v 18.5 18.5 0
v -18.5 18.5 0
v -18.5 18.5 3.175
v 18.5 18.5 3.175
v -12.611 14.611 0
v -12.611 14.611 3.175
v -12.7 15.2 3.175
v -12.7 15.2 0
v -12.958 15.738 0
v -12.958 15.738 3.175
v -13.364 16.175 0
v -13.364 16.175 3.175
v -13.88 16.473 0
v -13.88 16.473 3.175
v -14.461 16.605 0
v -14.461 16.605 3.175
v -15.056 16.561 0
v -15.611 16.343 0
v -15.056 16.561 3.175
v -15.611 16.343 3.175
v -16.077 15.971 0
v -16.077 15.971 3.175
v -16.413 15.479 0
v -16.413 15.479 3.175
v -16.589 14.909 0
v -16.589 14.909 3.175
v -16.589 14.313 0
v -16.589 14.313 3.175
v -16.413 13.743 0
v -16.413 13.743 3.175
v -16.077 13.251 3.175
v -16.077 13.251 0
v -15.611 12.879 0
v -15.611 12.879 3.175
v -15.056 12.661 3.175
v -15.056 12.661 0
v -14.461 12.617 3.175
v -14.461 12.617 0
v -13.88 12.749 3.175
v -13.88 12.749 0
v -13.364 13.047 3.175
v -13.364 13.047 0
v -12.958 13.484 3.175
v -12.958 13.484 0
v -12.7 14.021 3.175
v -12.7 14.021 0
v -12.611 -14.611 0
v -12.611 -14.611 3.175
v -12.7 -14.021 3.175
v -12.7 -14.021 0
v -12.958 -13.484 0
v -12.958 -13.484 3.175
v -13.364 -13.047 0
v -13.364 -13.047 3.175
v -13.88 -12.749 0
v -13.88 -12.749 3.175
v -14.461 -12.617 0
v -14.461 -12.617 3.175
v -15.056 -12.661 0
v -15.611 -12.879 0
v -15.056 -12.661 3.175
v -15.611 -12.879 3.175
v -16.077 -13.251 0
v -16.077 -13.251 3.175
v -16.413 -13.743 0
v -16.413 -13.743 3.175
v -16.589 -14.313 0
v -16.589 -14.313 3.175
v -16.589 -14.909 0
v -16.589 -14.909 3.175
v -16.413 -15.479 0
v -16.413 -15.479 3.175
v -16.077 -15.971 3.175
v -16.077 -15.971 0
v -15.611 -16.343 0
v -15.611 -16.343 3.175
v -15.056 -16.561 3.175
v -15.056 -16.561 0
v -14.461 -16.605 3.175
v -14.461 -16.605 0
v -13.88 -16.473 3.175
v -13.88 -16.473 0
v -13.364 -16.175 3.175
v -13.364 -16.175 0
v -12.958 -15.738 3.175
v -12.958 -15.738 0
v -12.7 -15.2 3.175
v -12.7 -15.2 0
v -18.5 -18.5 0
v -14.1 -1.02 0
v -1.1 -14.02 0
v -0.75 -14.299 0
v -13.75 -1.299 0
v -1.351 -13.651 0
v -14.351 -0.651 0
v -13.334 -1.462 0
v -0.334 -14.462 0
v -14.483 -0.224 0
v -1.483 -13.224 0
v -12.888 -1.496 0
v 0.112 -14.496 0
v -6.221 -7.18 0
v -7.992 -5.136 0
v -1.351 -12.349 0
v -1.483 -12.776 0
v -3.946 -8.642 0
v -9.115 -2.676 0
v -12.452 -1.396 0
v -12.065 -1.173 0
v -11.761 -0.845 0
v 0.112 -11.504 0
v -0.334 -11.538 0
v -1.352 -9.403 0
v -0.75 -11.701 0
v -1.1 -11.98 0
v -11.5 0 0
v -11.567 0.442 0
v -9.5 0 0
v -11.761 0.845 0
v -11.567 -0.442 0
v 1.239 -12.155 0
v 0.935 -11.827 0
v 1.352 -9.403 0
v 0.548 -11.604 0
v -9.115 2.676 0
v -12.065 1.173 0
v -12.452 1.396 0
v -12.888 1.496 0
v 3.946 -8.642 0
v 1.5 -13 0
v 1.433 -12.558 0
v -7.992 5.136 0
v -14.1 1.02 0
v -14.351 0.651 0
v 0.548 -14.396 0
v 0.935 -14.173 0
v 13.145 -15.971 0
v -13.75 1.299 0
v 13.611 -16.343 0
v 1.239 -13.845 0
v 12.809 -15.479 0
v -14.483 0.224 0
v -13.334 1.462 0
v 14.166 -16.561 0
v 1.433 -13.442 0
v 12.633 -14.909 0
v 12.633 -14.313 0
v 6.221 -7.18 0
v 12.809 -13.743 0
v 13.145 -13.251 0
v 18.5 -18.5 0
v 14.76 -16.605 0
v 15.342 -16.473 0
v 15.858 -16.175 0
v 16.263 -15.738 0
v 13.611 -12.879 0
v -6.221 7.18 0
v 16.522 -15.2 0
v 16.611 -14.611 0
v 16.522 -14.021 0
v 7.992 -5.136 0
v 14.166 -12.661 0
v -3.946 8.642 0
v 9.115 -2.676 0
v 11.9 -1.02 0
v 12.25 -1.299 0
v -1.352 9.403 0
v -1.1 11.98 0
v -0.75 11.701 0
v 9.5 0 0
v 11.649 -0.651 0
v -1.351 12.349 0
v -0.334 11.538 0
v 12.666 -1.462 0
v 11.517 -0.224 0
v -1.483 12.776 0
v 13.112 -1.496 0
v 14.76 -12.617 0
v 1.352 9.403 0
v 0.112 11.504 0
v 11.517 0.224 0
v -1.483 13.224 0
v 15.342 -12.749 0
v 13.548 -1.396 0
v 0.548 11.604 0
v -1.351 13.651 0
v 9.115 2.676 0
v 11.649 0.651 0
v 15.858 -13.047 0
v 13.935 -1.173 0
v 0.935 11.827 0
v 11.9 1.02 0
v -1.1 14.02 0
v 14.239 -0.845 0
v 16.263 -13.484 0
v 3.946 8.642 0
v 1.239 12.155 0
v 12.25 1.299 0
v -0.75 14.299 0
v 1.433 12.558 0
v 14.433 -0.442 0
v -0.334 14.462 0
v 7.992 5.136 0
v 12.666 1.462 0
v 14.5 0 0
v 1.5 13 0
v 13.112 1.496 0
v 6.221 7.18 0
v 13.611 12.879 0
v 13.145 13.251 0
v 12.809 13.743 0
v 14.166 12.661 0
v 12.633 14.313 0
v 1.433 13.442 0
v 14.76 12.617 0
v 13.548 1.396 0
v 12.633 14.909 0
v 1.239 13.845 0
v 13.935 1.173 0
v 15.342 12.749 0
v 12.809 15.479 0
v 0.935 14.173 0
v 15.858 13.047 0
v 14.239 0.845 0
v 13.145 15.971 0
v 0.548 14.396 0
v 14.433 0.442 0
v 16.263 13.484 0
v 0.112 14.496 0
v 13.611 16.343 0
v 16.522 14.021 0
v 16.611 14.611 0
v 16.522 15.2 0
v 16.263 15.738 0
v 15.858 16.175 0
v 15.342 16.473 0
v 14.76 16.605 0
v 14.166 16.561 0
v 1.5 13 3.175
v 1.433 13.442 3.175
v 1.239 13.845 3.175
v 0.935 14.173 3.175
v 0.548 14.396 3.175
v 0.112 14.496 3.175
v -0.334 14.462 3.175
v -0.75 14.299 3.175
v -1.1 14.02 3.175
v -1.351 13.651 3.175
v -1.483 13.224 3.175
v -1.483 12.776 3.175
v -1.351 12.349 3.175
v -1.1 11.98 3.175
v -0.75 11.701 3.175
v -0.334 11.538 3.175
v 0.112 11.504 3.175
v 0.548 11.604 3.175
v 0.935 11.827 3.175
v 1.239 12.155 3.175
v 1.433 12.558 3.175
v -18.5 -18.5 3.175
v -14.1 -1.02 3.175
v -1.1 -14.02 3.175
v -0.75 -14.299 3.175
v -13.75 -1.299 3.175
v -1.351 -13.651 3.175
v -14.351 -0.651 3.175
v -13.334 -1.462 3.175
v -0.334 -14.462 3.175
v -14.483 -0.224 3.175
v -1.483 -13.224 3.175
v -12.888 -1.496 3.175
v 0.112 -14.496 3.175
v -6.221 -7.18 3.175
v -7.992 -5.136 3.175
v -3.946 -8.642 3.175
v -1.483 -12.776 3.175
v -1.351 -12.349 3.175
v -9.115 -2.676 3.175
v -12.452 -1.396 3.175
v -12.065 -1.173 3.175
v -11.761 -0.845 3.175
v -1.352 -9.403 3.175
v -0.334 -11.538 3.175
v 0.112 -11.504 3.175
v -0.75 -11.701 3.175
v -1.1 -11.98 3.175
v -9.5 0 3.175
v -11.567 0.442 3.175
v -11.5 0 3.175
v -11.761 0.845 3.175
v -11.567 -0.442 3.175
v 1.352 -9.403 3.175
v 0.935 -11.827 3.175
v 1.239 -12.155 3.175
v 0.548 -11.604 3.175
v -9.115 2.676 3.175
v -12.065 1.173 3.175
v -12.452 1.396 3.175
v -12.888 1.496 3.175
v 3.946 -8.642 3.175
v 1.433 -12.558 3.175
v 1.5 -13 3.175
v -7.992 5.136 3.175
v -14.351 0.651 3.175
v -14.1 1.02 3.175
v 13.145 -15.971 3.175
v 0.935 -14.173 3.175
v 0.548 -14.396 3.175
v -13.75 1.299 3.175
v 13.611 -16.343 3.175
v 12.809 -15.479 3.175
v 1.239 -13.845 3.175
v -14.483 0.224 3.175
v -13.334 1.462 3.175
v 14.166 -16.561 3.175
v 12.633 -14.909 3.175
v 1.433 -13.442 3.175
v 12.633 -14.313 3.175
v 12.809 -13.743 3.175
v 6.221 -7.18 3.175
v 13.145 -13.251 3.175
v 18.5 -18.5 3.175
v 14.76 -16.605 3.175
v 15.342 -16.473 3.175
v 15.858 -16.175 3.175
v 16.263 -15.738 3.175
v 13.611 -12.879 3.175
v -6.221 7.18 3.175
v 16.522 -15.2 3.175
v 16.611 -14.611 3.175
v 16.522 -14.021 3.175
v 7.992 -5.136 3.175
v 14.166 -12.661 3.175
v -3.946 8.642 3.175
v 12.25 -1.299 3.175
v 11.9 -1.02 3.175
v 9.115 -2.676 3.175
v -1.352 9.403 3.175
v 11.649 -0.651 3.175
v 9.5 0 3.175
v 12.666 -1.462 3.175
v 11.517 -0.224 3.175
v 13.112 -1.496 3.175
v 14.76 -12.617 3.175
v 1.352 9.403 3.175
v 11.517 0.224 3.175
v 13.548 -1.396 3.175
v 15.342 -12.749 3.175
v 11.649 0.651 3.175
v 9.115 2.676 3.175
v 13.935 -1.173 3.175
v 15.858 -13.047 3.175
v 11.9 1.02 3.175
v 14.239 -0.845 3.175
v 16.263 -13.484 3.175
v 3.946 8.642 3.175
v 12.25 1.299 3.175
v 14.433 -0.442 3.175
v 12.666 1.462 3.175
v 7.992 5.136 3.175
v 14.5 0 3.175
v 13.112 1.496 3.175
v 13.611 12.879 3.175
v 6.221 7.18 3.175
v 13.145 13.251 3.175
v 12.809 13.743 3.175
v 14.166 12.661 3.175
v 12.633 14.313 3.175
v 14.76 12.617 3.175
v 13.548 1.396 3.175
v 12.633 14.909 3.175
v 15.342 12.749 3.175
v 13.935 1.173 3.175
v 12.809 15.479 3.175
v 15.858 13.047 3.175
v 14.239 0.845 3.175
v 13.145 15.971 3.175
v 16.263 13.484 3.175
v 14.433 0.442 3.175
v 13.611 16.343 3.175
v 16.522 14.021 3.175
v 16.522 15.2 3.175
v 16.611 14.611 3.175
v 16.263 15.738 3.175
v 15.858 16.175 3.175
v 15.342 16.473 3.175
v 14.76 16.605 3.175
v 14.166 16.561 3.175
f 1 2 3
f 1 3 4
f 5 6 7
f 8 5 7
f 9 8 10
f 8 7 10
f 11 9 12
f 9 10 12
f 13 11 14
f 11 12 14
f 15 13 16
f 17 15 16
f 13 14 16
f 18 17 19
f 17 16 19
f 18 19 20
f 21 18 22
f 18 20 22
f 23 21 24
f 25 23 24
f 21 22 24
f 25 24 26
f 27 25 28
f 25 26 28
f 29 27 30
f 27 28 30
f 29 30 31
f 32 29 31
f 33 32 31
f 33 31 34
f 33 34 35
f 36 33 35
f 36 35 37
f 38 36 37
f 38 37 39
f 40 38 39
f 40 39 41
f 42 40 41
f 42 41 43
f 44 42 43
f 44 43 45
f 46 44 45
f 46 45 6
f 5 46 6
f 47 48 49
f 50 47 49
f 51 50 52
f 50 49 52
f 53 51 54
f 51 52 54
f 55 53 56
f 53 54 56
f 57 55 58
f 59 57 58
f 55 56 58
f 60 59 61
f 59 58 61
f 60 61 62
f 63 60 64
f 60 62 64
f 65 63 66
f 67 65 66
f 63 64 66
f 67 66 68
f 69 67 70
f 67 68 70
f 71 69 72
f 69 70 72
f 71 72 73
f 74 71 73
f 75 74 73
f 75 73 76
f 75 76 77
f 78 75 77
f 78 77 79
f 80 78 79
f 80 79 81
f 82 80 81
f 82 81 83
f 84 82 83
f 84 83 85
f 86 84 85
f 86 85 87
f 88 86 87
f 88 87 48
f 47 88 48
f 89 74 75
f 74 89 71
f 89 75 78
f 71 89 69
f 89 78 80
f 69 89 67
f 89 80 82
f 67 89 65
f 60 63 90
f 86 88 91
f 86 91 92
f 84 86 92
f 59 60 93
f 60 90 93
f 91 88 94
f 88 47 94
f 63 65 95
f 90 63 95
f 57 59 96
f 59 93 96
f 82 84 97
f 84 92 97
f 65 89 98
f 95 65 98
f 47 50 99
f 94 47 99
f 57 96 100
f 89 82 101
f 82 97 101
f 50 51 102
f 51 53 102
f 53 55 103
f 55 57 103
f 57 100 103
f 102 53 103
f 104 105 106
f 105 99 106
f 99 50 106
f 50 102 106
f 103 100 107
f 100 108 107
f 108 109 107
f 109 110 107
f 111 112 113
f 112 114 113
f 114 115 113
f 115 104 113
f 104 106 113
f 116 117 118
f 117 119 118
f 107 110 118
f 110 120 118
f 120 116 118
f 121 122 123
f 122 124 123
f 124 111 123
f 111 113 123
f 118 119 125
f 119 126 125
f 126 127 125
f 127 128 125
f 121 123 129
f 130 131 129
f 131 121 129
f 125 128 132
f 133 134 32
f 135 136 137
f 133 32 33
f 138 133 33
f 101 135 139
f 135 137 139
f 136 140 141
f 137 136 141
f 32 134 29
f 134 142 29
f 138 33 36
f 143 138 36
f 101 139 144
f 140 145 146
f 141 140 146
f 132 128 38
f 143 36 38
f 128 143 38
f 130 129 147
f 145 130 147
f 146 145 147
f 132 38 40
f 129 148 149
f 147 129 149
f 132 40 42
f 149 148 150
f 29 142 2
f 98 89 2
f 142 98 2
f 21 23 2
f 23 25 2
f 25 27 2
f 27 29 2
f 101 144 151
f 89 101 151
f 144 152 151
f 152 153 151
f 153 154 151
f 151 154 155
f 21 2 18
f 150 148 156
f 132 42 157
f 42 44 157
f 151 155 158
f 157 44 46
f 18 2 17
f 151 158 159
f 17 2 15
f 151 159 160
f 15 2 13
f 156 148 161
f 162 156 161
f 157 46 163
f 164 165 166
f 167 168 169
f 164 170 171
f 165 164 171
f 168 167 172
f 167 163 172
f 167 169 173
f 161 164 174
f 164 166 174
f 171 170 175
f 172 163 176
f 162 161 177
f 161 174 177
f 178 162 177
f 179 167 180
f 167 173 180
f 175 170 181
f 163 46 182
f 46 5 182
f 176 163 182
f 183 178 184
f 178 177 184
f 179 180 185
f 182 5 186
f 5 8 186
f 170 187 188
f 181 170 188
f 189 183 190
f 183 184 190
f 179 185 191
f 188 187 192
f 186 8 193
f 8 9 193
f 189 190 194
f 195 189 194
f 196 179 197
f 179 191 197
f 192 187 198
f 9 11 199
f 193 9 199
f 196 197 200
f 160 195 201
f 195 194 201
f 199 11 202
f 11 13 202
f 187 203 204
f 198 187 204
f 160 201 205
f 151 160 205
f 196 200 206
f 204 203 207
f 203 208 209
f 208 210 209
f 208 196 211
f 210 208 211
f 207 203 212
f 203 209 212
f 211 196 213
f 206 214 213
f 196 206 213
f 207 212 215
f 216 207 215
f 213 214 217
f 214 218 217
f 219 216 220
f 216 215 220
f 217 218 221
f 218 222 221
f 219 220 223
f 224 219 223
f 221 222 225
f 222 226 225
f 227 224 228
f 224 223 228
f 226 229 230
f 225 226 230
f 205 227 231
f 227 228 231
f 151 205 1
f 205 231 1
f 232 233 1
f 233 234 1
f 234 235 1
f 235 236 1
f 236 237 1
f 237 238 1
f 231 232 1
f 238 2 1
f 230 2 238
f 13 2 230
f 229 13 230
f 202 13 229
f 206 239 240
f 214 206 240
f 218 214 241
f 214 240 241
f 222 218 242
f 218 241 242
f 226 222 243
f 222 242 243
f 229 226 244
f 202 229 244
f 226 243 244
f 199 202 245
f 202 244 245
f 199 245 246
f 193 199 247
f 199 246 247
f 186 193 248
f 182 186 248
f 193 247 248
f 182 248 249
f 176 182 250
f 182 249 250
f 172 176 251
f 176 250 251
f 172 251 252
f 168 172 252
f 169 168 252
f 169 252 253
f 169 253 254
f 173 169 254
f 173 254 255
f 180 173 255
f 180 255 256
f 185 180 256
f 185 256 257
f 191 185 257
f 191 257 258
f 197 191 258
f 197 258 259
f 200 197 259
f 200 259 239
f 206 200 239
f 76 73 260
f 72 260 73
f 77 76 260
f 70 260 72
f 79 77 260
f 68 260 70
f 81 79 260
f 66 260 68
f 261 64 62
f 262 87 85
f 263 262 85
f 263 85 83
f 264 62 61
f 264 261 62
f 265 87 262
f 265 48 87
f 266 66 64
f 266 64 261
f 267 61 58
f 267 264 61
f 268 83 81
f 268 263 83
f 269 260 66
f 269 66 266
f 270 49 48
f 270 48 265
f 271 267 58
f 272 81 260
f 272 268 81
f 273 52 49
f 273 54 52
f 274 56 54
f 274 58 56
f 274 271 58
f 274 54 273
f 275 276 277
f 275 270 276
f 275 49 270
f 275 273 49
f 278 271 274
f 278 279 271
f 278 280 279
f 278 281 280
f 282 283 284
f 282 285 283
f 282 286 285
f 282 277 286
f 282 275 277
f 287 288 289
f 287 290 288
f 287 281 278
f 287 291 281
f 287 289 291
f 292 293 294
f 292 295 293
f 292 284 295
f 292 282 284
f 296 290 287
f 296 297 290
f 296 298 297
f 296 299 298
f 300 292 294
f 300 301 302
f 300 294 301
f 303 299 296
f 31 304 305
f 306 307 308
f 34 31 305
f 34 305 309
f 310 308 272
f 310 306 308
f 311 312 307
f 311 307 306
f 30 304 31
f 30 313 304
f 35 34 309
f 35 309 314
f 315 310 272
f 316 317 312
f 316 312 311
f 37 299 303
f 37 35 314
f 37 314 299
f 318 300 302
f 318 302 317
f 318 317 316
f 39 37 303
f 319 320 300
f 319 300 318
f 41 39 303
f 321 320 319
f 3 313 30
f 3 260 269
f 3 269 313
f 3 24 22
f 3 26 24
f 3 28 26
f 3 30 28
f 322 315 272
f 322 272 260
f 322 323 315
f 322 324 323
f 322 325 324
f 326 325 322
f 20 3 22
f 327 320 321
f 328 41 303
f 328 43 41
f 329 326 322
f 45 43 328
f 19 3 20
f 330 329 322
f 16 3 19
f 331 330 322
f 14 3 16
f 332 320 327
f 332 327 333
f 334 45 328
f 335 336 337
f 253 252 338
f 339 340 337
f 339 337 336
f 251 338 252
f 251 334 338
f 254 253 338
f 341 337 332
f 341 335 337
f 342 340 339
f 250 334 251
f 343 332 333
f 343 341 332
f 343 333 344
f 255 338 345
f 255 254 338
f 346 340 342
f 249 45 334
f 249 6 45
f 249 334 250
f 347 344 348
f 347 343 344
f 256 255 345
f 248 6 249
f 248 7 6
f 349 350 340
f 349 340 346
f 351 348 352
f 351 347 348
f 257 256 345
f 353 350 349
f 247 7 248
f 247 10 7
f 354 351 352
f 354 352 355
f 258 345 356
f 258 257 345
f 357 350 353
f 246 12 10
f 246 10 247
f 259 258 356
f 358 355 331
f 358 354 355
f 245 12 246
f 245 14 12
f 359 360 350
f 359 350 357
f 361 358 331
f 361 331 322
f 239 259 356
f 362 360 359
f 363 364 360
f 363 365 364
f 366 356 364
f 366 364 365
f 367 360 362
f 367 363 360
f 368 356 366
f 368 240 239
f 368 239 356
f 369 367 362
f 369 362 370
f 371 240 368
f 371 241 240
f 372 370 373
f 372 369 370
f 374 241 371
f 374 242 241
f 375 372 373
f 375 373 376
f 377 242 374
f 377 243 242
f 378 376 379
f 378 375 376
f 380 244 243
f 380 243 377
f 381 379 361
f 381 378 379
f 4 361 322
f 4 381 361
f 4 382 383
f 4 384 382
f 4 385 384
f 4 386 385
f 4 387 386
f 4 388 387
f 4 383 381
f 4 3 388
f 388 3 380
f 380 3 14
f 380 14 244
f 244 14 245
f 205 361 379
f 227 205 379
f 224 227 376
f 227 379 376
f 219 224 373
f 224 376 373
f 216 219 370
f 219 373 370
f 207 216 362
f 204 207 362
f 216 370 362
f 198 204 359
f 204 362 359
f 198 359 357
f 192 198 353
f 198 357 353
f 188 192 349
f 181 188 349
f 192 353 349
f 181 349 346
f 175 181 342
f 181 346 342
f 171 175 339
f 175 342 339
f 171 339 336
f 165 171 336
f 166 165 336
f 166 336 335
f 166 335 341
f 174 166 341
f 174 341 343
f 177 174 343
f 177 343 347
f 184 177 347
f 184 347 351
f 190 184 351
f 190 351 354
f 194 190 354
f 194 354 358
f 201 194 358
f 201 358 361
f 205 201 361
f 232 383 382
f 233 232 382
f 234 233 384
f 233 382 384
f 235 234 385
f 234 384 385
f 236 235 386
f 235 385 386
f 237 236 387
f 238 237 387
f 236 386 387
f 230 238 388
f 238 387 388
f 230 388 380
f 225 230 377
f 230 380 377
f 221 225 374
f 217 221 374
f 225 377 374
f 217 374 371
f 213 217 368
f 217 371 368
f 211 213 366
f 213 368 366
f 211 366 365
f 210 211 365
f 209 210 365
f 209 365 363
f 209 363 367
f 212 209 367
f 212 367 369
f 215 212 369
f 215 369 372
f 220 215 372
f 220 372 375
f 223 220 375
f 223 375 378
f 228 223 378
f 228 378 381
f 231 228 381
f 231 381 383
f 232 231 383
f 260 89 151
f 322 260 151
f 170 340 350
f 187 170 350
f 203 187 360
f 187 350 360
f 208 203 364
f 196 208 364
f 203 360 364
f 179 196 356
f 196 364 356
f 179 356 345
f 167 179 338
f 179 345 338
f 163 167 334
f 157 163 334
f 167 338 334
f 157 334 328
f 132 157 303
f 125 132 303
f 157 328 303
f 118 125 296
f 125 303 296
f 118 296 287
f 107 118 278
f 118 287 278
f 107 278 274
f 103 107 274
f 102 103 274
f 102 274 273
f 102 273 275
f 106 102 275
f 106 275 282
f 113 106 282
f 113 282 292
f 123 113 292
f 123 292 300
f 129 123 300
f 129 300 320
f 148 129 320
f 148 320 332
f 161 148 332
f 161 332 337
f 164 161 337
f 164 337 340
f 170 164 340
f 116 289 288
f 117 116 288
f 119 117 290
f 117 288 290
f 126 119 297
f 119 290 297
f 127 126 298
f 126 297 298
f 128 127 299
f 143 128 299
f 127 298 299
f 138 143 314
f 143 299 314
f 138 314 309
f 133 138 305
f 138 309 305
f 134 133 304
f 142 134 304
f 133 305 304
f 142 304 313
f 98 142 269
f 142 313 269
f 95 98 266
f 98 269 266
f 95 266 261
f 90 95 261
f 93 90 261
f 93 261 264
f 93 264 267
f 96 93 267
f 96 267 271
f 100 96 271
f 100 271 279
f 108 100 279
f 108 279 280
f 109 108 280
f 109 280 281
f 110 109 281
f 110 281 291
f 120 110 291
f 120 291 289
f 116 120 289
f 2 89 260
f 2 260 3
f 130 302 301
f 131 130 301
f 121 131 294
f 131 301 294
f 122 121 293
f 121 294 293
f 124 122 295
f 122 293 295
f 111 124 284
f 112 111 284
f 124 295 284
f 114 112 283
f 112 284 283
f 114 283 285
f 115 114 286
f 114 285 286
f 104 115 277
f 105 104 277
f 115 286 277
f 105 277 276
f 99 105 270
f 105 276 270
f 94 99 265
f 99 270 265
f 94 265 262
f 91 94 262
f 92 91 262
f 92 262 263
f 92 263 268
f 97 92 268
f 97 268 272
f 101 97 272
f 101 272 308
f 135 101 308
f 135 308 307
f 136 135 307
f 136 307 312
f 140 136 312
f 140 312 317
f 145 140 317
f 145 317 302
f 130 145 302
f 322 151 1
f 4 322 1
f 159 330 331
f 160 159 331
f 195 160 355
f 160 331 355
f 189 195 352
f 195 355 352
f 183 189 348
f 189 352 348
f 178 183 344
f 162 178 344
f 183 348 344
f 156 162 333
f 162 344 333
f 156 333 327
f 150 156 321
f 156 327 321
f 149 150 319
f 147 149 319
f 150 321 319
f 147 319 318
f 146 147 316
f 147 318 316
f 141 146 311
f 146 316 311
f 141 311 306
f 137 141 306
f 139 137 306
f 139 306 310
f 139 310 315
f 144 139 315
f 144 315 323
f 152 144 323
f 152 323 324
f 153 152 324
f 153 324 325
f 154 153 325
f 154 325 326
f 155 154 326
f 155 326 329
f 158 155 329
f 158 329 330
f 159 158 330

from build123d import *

# Parameters (mm, degrees)
SKETCH1_W           = 37
SKETCH1_H           = 37
BOSS_EXTRUDE1_DEPTH = 3.175
SKETCH2_R           = 9.5
CUT_EXTRUDE1_DEPTH  = 27.354897552
SKETCH3_R           = 1.5
CUT_EXTRUDE2_DEPTH  = 27.354897552
SKETCH4_R           = 2
CUT_EXTRUDE3_DEPTH  = 27.354897552


with BuildPart() as part:
    # Sketch1 → Boss-Extrude1 (new body)
    with BuildSketch(Plane.XY):
        Rectangle(SKETCH1_W, SKETCH1_H)
    extrude(amount=BOSS_EXTRUDE1_DEPTH)

    # Sketch2 → Cut-Extrude1 (cut, through all)
    with BuildSketch(Plane.XY.offset(3.175)):
        Circle(SKETCH2_R)
    extrude(amount=-CUT_EXTRUDE1_DEPTH, mode=Mode.SUBTRACT)

    # Sketch3 → Cut-Extrude2 (cut, through all)
    with BuildSketch(Plane.XY.offset(3.175)):
        with Locations((-13, 0)):
            Circle(SKETCH3_R)
        with Locations((0, 13)):
            Circle(SKETCH3_R)
        with Locations((13, 0)):
            Circle(SKETCH3_R)
        with Locations((0, -13)):
            Circle(SKETCH3_R)
    extrude(amount=-CUT_EXTRUDE2_DEPTH, mode=Mode.SUBTRACT)

    # Sketch4 → Cut-Extrude3 (cut, through all)
    with BuildSketch(Plane.XY.offset(3.175)):
        with Locations((-14.610912703, 14.610912703)):
            Circle(SKETCH4_R)
        with Locations((14.610912703, 14.610912703)):
            Circle(SKETCH4_R)
        with Locations((14.610912703, -14.610912703)):
            Circle(SKETCH4_R)
        with Locations((-14.610912703, -14.610912703)):
            Circle(SKETCH4_R)
    extrude(amount=-CUT_EXTRUDE3_DEPTH, mode=Mode.SUBTRACT)


solid = part.part
